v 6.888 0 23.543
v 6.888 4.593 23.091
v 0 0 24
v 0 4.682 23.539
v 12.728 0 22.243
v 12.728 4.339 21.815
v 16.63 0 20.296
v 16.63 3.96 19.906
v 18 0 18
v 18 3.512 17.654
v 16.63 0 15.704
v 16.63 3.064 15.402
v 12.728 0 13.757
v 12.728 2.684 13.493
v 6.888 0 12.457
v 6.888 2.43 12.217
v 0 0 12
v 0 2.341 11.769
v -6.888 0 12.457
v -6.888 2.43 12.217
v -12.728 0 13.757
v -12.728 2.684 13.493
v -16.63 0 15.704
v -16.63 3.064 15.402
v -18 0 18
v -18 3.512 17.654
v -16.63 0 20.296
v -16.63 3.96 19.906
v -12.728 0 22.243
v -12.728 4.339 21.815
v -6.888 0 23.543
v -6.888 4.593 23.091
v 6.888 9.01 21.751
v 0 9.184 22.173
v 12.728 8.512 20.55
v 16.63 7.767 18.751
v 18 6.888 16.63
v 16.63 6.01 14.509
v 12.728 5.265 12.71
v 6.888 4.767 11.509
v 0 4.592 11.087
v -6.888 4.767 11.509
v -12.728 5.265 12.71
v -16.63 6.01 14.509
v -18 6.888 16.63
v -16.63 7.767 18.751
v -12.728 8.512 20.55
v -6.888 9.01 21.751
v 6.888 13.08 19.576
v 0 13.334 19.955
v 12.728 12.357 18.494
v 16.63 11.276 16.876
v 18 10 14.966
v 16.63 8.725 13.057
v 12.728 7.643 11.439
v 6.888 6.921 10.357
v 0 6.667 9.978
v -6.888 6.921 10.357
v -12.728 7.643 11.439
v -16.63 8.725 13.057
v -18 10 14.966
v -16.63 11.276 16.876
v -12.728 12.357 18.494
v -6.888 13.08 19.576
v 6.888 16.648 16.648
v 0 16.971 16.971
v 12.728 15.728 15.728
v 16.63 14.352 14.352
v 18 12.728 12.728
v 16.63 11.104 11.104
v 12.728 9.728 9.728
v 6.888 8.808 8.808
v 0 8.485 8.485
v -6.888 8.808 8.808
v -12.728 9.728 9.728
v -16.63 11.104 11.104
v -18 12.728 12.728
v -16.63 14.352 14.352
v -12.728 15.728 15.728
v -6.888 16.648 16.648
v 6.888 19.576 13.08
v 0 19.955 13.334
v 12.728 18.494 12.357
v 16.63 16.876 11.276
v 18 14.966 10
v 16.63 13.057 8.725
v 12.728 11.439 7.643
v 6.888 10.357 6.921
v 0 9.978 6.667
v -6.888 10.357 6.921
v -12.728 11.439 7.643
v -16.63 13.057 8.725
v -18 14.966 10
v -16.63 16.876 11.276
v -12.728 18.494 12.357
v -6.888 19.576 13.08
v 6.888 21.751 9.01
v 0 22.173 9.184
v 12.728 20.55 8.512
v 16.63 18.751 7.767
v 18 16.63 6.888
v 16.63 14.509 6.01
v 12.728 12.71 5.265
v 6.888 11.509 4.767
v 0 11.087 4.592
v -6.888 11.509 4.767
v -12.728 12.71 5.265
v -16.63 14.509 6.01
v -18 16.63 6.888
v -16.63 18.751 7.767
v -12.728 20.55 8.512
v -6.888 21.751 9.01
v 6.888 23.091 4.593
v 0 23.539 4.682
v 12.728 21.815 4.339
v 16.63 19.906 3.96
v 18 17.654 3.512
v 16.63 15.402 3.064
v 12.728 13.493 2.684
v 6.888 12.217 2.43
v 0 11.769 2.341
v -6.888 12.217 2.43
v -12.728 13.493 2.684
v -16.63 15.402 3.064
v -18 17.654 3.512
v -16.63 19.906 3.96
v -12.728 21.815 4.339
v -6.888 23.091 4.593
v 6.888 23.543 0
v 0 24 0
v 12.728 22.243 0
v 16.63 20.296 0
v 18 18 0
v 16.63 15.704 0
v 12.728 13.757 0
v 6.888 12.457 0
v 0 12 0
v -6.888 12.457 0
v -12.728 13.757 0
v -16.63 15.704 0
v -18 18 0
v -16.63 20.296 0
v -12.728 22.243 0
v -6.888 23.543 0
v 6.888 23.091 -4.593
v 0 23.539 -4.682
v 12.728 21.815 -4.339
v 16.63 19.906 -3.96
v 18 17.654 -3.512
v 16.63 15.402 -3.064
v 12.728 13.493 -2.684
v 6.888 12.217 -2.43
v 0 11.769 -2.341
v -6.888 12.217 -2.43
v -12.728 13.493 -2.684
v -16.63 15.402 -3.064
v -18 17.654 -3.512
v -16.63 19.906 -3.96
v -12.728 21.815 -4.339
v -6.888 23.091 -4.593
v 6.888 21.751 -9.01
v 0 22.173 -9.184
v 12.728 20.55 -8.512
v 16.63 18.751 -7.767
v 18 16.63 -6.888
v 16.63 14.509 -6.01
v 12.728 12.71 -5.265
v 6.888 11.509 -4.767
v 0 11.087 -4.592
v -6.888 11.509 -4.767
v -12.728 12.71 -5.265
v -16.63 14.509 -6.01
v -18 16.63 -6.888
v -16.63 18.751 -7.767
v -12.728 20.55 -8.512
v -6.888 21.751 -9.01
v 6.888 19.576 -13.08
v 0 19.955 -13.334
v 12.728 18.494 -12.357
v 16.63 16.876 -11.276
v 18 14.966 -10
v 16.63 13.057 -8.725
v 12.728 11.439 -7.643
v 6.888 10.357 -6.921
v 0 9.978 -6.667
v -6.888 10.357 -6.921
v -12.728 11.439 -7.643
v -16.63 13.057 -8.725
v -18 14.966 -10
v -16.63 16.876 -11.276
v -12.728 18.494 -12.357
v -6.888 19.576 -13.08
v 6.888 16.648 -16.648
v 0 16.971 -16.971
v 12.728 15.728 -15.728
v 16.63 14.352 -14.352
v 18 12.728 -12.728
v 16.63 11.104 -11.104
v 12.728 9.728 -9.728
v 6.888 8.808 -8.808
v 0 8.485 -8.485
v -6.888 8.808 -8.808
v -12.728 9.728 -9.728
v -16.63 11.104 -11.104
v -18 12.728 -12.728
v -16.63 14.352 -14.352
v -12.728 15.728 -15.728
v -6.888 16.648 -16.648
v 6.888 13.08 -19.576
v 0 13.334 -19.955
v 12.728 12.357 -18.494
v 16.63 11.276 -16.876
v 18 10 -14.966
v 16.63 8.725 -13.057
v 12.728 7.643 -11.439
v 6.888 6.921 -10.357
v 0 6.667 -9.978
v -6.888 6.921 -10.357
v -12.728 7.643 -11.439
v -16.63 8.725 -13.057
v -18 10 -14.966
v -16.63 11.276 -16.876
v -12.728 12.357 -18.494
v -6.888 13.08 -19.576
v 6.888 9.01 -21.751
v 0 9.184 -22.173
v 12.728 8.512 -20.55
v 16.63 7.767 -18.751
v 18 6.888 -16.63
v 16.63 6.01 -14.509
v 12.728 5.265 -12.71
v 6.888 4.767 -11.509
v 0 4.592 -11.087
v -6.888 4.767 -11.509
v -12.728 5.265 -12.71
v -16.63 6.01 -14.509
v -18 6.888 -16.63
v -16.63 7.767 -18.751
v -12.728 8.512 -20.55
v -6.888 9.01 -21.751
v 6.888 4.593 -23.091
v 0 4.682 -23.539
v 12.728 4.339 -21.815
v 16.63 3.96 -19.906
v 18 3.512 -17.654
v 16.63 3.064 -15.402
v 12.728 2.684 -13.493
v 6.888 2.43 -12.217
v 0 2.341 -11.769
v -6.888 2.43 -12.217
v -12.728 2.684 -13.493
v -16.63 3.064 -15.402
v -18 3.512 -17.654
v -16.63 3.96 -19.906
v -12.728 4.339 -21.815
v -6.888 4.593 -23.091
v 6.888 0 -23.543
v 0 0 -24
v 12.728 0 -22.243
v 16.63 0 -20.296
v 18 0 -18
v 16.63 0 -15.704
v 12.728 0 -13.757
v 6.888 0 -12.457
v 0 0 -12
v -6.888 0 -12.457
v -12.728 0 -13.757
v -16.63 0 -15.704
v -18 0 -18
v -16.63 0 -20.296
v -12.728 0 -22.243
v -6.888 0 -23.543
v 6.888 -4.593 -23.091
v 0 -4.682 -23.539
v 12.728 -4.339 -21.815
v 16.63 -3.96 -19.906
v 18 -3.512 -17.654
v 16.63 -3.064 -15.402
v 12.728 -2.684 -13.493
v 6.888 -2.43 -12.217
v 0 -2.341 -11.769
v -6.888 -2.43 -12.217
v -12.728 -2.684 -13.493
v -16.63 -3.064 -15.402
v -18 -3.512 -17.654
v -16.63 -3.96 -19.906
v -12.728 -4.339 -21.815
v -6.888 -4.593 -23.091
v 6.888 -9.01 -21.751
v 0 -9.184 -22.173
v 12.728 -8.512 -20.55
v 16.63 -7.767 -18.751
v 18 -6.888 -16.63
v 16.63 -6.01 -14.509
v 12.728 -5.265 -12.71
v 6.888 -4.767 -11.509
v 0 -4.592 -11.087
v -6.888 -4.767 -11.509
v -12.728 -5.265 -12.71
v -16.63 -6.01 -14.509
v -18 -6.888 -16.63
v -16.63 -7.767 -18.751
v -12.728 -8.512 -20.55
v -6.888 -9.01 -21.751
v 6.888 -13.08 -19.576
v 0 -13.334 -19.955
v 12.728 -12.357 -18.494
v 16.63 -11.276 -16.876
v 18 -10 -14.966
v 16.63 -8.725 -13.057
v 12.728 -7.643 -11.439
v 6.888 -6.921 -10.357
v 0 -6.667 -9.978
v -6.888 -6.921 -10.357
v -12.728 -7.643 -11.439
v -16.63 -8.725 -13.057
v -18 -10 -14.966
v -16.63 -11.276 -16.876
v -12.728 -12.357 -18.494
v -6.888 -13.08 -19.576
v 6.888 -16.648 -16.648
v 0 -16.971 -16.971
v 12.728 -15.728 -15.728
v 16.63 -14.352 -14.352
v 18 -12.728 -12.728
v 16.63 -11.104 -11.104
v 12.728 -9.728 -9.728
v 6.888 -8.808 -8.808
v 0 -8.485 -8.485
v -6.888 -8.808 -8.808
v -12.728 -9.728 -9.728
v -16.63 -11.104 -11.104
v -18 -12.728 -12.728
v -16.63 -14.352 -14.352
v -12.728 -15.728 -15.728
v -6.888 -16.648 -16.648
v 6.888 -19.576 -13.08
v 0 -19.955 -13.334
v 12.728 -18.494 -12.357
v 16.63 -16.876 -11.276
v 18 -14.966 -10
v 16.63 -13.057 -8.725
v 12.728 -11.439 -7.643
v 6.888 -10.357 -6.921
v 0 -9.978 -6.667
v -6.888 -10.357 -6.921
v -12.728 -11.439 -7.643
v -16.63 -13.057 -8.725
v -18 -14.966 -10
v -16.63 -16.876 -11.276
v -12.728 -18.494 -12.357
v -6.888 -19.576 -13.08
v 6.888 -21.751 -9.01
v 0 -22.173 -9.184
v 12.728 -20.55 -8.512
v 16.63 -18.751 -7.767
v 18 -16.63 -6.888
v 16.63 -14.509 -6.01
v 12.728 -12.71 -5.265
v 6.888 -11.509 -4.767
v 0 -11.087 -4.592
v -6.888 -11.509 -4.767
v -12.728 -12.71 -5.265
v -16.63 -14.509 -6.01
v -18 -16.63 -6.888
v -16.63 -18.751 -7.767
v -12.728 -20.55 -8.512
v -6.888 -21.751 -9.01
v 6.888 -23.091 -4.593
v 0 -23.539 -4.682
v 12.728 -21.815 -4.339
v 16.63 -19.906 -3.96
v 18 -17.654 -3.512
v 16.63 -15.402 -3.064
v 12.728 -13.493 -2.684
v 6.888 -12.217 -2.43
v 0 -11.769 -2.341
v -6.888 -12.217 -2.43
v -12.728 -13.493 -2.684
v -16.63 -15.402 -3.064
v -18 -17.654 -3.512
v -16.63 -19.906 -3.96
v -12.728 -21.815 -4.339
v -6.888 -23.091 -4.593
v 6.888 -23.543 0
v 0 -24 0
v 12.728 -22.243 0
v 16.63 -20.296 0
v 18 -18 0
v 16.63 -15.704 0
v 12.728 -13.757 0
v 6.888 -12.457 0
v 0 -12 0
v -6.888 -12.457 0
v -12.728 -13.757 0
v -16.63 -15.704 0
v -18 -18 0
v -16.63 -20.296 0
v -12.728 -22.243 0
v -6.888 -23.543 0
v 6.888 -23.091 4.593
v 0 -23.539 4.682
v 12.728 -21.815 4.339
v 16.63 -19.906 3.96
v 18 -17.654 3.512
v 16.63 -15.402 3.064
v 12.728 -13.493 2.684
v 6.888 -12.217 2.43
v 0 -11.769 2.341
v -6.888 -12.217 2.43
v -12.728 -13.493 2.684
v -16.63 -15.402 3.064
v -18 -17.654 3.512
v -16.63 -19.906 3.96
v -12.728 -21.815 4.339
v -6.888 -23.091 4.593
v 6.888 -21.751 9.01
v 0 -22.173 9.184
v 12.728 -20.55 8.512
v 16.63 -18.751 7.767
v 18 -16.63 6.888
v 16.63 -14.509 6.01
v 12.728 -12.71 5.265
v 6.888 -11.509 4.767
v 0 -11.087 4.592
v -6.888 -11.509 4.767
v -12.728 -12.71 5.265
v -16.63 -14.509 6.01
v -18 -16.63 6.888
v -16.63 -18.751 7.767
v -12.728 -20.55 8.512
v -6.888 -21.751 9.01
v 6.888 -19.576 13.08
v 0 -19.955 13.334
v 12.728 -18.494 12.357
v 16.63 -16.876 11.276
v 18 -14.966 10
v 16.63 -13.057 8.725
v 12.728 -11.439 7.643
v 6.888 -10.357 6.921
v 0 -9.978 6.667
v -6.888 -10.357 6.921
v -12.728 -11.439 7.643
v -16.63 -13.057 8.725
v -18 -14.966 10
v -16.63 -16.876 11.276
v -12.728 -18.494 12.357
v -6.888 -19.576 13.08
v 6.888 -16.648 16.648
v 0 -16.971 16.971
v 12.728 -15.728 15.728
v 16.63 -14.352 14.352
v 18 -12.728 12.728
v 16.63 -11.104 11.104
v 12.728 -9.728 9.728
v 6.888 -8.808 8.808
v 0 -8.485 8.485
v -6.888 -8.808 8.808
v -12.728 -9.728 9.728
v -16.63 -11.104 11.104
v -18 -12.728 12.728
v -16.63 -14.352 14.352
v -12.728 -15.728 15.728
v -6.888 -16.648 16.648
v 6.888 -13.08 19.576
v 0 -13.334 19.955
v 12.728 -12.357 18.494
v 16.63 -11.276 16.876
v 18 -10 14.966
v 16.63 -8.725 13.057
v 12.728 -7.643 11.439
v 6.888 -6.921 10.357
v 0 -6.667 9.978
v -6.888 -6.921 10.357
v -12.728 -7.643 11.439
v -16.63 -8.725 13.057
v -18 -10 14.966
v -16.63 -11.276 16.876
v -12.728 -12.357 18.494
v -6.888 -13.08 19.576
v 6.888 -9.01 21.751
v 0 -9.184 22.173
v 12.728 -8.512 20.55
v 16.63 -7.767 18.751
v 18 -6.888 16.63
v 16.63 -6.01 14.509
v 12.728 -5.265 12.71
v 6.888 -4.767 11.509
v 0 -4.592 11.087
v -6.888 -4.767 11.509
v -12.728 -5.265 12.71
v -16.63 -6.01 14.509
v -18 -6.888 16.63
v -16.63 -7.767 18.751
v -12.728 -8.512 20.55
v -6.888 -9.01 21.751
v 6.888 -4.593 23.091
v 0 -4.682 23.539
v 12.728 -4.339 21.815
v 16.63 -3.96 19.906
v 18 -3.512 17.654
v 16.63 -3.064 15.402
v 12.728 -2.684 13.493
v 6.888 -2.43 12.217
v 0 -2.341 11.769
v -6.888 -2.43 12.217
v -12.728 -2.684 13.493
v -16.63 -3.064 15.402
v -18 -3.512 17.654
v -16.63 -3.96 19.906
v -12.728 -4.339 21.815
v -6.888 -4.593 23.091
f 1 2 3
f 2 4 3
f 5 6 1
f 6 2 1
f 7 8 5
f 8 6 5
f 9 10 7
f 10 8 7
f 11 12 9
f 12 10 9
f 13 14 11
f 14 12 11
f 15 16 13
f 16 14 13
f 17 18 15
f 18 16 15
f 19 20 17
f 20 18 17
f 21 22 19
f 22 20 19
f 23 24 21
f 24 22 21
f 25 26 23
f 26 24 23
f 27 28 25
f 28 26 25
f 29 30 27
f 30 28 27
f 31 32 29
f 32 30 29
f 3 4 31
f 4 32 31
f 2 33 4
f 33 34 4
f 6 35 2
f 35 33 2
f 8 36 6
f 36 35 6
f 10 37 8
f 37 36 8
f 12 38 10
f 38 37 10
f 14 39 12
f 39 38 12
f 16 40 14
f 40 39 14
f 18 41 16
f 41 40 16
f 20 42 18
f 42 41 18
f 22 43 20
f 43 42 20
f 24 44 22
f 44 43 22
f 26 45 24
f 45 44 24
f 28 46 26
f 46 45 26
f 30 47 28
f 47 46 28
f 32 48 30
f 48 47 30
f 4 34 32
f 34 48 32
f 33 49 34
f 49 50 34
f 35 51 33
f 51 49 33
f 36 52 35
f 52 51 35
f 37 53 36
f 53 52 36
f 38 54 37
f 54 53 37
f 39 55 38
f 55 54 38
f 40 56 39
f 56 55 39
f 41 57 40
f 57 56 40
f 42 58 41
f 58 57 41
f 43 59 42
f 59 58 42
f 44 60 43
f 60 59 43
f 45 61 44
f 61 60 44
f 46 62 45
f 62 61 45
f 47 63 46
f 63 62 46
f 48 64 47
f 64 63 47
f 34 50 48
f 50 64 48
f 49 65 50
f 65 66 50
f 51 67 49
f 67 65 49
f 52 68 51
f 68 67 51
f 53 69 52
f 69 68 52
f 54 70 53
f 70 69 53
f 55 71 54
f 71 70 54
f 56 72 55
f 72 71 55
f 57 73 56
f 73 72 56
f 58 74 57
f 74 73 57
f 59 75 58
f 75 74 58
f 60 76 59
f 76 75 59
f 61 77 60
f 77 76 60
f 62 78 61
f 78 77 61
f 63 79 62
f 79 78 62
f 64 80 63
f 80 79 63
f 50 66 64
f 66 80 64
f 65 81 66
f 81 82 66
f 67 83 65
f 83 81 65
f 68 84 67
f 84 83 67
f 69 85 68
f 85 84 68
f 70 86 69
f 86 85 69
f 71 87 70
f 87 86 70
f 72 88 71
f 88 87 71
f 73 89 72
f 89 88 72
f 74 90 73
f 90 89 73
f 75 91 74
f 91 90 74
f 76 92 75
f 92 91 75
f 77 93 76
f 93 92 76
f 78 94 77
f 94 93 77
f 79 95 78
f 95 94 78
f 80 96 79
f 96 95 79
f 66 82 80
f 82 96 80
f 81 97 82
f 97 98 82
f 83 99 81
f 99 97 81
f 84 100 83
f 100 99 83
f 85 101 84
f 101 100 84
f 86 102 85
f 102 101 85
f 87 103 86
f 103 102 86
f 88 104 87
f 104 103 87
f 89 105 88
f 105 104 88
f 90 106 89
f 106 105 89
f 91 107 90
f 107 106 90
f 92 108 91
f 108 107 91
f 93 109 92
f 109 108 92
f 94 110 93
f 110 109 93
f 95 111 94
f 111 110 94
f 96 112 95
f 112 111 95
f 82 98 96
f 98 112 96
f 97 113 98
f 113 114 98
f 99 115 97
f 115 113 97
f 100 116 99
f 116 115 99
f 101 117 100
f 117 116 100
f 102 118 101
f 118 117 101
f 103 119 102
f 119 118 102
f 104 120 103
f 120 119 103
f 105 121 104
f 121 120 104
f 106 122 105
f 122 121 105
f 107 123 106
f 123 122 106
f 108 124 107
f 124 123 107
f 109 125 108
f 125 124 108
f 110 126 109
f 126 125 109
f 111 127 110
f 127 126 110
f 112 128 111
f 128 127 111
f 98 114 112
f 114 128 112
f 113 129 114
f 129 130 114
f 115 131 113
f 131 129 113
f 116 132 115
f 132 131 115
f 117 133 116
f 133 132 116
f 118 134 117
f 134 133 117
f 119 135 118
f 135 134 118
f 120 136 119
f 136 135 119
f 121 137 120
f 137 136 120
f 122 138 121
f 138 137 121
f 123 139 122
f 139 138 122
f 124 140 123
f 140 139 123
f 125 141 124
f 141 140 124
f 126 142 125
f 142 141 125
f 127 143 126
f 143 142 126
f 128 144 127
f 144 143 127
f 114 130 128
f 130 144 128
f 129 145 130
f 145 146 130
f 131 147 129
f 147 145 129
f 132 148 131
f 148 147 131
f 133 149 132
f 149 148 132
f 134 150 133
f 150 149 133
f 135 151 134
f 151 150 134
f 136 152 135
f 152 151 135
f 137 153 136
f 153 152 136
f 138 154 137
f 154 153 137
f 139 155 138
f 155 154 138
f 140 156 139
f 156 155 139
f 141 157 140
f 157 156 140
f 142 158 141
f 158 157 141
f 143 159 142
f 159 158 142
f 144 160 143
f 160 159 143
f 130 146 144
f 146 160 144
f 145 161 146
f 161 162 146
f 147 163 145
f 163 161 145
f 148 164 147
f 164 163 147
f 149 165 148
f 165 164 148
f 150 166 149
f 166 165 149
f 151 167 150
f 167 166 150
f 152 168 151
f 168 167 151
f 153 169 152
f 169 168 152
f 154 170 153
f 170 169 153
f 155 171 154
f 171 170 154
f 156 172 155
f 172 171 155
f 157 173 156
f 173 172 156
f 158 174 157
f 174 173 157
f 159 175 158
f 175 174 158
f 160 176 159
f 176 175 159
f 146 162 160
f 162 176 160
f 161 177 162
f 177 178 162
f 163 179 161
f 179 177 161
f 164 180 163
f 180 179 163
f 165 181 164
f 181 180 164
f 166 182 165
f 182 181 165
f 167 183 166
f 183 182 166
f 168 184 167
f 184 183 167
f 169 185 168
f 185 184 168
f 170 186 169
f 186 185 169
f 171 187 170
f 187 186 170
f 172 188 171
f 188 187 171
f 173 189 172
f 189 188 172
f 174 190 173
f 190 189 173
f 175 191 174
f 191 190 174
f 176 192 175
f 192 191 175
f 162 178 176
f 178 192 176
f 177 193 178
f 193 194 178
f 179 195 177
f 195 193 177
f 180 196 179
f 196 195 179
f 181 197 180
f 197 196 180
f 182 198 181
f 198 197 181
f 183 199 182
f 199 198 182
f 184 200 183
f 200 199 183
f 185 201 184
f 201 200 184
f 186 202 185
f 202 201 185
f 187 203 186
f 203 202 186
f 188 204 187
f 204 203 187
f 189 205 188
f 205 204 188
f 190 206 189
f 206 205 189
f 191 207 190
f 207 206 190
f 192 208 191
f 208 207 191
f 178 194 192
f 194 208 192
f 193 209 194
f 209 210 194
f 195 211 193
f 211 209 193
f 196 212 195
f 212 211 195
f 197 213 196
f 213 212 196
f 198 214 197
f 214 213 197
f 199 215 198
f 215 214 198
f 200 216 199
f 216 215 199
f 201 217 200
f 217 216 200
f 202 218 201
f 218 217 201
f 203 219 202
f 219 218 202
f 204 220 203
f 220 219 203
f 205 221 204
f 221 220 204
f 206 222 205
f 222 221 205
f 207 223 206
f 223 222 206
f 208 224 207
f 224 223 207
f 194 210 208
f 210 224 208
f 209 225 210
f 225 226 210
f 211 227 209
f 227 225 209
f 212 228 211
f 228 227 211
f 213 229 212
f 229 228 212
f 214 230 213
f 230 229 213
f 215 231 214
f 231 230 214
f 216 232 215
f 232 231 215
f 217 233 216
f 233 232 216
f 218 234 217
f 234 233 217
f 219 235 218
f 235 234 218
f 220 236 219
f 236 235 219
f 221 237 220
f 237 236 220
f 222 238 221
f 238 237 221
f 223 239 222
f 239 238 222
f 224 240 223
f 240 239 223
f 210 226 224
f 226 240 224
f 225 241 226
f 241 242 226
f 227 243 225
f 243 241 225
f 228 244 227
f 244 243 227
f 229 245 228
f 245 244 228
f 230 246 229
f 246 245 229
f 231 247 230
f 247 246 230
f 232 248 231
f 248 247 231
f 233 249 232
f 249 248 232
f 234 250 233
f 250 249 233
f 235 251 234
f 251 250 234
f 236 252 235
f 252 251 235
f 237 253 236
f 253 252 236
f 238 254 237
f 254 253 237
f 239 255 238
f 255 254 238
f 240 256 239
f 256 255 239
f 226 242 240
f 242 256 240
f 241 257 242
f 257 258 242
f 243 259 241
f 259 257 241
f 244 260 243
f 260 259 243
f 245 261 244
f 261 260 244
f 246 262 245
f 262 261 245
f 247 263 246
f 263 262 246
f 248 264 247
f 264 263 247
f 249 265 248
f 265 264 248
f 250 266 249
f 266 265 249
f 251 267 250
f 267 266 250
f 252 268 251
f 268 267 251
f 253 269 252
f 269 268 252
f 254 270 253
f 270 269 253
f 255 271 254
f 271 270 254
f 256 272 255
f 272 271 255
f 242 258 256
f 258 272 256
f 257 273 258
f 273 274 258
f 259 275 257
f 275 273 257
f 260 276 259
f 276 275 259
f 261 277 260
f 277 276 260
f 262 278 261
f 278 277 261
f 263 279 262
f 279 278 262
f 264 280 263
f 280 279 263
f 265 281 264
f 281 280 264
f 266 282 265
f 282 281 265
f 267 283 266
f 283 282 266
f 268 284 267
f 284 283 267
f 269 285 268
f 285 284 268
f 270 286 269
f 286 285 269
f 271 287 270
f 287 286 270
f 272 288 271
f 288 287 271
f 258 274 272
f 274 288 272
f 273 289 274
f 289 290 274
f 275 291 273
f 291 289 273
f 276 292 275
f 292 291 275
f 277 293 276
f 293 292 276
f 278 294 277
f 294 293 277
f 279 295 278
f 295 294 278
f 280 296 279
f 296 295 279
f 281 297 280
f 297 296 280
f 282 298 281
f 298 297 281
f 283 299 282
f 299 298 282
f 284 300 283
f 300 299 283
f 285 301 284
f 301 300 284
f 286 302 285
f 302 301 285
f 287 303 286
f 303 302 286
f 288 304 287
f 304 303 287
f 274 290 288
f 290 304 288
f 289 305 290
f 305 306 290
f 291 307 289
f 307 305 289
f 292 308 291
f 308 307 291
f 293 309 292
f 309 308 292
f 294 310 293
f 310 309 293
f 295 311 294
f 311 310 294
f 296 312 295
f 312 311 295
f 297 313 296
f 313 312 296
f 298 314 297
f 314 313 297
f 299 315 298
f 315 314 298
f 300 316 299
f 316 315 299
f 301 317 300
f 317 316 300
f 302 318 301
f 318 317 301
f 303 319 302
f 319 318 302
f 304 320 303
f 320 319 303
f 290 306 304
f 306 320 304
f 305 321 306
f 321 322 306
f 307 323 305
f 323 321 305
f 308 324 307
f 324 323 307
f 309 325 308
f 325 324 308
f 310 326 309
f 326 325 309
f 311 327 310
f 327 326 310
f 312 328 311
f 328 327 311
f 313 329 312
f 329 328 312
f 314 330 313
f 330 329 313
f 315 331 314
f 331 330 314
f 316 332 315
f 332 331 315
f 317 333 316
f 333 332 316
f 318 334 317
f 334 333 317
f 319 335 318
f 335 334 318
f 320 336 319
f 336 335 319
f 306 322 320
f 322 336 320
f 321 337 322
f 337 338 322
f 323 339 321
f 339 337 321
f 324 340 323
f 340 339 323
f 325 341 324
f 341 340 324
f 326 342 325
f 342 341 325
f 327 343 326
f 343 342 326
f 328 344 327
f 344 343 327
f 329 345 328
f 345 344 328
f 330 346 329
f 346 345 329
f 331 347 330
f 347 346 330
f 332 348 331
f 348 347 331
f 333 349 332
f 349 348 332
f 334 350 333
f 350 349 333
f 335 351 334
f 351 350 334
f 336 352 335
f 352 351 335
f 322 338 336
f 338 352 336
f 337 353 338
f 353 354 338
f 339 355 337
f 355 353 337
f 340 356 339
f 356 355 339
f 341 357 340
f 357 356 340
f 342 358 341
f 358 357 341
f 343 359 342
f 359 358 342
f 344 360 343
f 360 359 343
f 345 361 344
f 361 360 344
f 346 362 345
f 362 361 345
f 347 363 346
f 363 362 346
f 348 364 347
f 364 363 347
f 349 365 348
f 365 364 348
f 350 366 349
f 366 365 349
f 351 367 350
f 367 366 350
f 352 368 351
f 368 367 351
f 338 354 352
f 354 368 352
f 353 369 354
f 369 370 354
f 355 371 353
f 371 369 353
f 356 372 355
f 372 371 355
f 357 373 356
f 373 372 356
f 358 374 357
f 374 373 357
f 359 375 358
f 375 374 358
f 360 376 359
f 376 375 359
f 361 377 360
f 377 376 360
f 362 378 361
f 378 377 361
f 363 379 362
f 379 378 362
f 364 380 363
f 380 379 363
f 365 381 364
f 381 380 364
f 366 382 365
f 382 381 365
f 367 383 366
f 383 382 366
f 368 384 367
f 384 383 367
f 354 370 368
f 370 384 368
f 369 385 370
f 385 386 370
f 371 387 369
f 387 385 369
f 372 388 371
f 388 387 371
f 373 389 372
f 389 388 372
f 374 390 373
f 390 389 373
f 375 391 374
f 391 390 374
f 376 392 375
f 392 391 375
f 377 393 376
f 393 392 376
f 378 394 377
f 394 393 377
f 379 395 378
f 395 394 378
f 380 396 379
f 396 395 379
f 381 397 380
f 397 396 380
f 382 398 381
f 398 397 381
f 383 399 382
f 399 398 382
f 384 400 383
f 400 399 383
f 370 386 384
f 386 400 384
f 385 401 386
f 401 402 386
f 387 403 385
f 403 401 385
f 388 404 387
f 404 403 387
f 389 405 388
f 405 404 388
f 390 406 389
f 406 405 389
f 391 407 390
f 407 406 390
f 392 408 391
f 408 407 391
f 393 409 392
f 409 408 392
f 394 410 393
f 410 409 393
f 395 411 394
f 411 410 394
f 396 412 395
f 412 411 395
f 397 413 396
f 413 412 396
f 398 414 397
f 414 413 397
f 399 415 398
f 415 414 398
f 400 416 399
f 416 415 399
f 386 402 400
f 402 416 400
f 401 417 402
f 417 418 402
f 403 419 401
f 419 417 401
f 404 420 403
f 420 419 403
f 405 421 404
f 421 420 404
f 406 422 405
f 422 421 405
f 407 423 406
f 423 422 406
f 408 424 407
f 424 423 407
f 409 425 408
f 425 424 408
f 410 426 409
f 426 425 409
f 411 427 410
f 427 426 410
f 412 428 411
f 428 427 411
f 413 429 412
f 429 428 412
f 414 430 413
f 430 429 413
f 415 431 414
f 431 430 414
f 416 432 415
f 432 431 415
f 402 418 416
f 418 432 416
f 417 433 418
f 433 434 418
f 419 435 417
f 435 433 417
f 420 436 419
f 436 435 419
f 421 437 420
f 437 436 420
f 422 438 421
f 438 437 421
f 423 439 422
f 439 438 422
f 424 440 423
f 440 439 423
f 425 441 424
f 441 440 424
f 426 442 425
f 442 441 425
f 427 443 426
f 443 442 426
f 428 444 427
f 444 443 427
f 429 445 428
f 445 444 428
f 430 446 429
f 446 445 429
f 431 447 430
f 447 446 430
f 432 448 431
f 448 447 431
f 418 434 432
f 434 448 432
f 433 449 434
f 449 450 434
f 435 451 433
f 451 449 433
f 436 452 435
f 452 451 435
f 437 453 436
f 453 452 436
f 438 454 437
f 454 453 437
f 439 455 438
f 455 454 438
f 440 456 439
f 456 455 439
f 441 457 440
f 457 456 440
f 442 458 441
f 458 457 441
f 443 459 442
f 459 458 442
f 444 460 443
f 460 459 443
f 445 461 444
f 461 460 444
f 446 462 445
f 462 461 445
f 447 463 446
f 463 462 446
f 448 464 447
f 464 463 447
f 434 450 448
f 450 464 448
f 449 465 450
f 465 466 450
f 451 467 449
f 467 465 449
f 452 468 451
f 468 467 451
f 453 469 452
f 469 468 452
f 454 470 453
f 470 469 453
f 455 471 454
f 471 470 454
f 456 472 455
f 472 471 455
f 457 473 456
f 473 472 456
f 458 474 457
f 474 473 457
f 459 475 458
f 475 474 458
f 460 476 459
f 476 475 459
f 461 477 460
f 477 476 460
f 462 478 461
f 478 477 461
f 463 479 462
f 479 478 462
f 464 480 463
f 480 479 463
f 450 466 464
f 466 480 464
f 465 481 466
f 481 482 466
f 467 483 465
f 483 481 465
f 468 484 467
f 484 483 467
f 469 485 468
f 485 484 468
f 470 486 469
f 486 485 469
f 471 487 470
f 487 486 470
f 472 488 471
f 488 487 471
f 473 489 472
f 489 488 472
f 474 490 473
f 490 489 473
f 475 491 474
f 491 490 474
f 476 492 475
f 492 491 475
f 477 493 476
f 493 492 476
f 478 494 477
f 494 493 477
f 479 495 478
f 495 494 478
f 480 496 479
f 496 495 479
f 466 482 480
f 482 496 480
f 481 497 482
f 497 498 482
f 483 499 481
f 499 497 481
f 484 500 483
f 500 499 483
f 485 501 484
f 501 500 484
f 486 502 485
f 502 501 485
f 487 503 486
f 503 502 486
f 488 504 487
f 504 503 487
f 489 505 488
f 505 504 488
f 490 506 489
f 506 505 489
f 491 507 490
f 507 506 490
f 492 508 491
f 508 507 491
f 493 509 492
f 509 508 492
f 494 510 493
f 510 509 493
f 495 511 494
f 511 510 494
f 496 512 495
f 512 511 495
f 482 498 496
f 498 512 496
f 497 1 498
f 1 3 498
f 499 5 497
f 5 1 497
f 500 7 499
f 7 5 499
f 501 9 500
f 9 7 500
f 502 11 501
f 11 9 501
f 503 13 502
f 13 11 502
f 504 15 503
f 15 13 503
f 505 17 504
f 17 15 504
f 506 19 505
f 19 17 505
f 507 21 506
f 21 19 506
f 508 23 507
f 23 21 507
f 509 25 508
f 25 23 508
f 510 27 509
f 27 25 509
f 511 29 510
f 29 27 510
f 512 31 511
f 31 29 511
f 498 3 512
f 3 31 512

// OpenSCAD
$vpr = [$t*360, $t*720, 0];
color([$t<0.5?$t*2:2-($t*2), $t<0.5?1-($t*2):($t*2)-1, 0])
    rotate([0, 90, $t*1080]) 
        rotate_extrude($fn=32)
            translate([18, 0])
                rotate([0, 0, $t*360])            
                    scale([1, 3])
                        circle(d=12, $fn=16);
